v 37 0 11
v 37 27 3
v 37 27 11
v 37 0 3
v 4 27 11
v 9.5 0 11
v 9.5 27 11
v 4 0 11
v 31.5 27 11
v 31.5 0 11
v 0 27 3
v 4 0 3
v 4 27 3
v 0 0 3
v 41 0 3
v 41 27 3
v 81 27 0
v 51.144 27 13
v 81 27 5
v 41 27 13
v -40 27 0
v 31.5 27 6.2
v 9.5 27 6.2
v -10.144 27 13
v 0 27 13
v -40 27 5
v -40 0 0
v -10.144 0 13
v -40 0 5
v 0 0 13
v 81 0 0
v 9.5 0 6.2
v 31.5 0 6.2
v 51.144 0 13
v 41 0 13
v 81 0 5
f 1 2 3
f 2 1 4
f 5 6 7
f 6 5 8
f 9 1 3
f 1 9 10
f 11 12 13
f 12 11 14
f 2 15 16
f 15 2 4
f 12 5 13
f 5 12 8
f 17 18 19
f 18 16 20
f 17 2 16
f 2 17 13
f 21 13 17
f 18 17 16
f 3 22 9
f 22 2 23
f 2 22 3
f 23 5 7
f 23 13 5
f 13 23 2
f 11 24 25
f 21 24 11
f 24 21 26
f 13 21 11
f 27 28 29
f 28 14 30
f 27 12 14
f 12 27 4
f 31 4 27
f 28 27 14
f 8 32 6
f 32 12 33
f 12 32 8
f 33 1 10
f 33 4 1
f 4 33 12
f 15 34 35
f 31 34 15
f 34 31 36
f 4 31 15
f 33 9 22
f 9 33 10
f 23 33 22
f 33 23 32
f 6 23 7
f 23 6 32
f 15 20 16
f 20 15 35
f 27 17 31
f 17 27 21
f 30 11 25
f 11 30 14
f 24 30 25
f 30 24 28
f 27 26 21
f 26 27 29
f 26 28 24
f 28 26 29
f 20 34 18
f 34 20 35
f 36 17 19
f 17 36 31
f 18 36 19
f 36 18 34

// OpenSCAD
bar_outer_width = 41; // Includes spacing
bar_inner_width = 33;

bar_inside_depth = 8;
bar_middle_section_depth = 4.8;
bar_middle_section_width = 22;

arms_thickness = 10;

bar_cutout_extra = 3;

mounting_tape_width = 27;

arms_width = 40;

module bar_cutout() {
    
    cube([bar_outer_width, mounting_tape_width, bar_cutout_extra]);

    difference() {
        translate([(bar_outer_width - bar_inner_width)/2, 0, bar_cutout_extra]){
            cube([bar_inner_width, mounting_tape_width, bar_inside_depth]);
        }

        translate([(bar_outer_width - bar_middle_section_width)/2, 0, bar_cutout_extra+bar_inside_depth-bar_middle_section_depth]){
            cube([bar_middle_section_width, mounting_tape_width, bar_middle_section_depth]);
        }
    }
}

module left_arm() {
    difference(){
        cube([arms_width, mounting_tape_width, arms_thickness+bar_cutout_extra]);

        translate([0, 0, arms_thickness/2])
        rotate([0, -15, 0])
            cube([arms_width*2, mounting_tape_width, arms_thickness+bar_cutout_extra]);
    }
}

module right_arm() {
    translate([arms_width, mounting_tape_width, 0])
        rotate([0, 0, 180])
            left_arm();
}

bar_cutout();

translate([-arms_width, 0, 0]){
    left_arm();
}

translate([bar_outer_width, 0, 0])
    right_arm();


//translate([bar_outer_width, 0, 0])
//    cube([arms_width, mounting_tape_width, arms_thickness+bar_cutout_extra]);
